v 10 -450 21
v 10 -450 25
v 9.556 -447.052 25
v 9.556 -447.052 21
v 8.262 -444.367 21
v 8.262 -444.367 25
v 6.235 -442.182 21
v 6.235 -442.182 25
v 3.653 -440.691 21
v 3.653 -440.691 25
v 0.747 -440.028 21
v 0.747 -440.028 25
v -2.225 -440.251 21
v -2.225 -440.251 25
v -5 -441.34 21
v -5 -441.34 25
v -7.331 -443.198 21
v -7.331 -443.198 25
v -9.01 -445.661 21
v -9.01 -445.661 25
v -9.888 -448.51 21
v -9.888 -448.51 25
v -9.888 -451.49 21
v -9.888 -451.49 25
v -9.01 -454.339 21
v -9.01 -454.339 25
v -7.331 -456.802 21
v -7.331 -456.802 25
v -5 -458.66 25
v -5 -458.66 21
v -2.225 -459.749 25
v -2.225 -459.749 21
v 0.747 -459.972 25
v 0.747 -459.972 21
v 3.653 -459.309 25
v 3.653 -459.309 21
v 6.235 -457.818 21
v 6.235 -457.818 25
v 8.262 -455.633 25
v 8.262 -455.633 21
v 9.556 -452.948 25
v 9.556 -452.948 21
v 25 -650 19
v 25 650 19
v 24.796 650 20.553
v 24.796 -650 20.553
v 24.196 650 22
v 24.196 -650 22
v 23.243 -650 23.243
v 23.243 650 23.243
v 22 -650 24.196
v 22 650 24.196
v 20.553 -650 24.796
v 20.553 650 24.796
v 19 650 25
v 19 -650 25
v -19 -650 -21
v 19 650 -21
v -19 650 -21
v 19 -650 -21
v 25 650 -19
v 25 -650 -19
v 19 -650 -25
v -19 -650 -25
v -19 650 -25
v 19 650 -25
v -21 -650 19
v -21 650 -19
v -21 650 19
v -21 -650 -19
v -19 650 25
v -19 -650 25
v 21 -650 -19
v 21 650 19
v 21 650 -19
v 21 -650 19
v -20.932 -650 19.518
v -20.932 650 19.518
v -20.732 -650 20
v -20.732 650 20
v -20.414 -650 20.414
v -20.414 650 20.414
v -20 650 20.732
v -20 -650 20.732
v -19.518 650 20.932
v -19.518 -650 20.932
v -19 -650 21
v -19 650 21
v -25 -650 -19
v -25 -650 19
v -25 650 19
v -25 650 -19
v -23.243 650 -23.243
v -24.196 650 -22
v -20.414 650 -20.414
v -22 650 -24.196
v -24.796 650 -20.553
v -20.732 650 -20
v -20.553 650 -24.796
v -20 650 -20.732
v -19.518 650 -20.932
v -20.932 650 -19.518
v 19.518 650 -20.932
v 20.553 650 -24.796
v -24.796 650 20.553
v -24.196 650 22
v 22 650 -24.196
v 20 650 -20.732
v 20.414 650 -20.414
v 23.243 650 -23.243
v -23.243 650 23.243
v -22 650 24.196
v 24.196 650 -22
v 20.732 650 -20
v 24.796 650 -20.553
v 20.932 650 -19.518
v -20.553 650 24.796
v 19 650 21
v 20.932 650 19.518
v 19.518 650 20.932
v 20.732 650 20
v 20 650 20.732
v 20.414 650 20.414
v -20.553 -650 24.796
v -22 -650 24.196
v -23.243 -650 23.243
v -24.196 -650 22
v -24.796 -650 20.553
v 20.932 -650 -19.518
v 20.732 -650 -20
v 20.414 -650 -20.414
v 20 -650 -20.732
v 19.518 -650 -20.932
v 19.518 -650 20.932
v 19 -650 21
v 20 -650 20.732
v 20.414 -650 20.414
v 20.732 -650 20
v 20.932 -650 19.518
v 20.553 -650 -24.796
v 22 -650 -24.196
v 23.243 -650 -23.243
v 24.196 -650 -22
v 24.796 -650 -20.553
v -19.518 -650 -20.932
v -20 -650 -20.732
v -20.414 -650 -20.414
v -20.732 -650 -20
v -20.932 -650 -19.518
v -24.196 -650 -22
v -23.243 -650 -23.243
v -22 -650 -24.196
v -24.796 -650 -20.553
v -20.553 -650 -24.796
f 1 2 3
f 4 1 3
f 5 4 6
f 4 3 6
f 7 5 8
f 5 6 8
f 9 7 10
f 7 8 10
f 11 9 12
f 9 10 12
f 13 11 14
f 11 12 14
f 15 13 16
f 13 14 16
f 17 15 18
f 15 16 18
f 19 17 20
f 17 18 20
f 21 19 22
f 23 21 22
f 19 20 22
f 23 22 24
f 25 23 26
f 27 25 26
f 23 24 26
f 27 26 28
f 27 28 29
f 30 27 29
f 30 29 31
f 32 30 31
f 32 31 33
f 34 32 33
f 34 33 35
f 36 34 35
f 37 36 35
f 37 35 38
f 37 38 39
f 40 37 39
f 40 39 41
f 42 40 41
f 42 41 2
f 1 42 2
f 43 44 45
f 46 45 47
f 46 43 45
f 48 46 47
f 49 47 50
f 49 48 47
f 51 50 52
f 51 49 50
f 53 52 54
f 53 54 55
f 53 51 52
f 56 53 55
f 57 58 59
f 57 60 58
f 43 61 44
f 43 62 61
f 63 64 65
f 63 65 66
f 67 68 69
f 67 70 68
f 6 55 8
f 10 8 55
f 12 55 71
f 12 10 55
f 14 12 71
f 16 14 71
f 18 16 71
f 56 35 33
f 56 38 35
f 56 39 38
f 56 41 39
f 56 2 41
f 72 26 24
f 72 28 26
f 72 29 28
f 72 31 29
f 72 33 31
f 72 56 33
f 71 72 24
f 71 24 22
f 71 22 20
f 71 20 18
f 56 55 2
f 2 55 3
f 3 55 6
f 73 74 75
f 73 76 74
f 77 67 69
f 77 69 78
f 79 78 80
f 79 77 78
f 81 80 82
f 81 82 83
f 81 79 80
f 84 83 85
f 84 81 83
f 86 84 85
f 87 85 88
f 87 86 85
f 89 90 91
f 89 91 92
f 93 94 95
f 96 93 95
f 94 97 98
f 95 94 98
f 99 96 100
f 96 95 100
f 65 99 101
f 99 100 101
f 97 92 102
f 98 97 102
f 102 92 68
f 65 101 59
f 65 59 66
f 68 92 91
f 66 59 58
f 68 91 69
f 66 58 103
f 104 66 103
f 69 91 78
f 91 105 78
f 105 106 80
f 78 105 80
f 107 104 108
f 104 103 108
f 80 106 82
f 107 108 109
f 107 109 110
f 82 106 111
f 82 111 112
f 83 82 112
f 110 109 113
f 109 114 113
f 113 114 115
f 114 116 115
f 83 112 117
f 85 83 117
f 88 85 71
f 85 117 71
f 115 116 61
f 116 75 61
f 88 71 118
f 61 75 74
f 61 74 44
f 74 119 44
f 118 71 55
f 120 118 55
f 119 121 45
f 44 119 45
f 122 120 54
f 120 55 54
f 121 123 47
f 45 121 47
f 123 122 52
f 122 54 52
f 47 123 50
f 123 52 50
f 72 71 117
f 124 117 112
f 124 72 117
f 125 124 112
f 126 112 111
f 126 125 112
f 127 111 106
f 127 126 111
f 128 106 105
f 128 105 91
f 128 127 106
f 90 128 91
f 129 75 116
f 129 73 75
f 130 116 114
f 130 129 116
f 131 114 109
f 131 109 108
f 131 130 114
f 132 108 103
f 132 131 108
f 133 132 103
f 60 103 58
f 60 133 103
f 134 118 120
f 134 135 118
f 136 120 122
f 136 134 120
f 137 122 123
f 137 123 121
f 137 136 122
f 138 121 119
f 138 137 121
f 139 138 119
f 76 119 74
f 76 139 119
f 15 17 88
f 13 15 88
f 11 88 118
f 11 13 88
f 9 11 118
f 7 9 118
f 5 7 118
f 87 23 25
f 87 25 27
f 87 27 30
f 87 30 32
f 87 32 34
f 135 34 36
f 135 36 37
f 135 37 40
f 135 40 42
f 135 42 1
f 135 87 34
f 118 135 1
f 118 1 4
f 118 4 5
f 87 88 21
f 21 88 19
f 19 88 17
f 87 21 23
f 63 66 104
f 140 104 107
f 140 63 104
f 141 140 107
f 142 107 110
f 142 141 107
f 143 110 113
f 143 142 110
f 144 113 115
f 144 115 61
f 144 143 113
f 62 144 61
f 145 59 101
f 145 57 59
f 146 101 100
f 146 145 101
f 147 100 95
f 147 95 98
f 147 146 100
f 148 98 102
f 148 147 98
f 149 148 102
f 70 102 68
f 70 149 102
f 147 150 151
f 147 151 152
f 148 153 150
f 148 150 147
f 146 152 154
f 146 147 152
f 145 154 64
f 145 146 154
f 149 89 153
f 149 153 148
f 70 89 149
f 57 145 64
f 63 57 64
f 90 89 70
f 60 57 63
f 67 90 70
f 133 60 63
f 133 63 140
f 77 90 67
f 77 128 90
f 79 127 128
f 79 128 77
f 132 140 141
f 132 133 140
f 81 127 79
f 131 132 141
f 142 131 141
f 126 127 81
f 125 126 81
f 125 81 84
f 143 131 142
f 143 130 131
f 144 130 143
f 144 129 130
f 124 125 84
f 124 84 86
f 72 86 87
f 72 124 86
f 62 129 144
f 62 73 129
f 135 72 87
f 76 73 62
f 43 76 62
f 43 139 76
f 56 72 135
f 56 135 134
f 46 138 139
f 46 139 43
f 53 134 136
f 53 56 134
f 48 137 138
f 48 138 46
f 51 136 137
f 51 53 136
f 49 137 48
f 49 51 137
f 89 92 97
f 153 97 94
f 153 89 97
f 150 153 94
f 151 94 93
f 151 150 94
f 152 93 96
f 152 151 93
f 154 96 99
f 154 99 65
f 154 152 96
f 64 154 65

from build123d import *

# Parameters (mm, degrees)
F1_DEPTH = 650
F2_R     = 10
F3_DEPTH = 25


with BuildPart() as f1:
    # F0 (on Front) → F1 (new body, symmetric)
    with BuildSketch(Plane.XZ):
        with BuildLine():
            Line((19, 25), (-19, 25))
            ThreePointArc((-19, 25), (-23.242641, 23.242641), (-25, 19))
            Line((-25, 19), (-25, -19))
            ThreePointArc((-25, -19), (-23.242641, -23.242641), (-19, -25))
            Line((-19, -25), (19, -25))
            ThreePointArc((19, -25), (23.242641, -23.242641), (25, -19))
            Line((25, -19), (25, 19))
            ThreePointArc((25, 19), (23.242641, 23.242641), (19, 25))
        make_face()
        with BuildLine():
            ThreePointArc((-21, 19), (-20.414214, 20.414214), (-19, 21))
            Line((-19, 21), (19, 21))
            ThreePointArc((19, 21), (20.414214, 20.414214), (21, 19))
            Line((21, 19), (21, -19))
            ThreePointArc((21, -19), (20.414214, -20.414214), (19, -21))
            Line((19, -21), (-19, -21))
            ThreePointArc((-19, -21), (-20.414214, -20.414214), (-21, -19))
            Line((-21, -19), (-21, 19))
        make_face(mode=Mode.SUBTRACT)
    extrude(amount=F1_DEPTH, both=True)

    # F2 (on face) → F3 (cut)
    with BuildSketch(Plane.XY.offset(25)):
        with Locations((0, -450)):
            Circle(F2_R)
    extrude(amount=-F3_DEPTH, mode=Mode.SUBTRACT)


solid = f1.part
